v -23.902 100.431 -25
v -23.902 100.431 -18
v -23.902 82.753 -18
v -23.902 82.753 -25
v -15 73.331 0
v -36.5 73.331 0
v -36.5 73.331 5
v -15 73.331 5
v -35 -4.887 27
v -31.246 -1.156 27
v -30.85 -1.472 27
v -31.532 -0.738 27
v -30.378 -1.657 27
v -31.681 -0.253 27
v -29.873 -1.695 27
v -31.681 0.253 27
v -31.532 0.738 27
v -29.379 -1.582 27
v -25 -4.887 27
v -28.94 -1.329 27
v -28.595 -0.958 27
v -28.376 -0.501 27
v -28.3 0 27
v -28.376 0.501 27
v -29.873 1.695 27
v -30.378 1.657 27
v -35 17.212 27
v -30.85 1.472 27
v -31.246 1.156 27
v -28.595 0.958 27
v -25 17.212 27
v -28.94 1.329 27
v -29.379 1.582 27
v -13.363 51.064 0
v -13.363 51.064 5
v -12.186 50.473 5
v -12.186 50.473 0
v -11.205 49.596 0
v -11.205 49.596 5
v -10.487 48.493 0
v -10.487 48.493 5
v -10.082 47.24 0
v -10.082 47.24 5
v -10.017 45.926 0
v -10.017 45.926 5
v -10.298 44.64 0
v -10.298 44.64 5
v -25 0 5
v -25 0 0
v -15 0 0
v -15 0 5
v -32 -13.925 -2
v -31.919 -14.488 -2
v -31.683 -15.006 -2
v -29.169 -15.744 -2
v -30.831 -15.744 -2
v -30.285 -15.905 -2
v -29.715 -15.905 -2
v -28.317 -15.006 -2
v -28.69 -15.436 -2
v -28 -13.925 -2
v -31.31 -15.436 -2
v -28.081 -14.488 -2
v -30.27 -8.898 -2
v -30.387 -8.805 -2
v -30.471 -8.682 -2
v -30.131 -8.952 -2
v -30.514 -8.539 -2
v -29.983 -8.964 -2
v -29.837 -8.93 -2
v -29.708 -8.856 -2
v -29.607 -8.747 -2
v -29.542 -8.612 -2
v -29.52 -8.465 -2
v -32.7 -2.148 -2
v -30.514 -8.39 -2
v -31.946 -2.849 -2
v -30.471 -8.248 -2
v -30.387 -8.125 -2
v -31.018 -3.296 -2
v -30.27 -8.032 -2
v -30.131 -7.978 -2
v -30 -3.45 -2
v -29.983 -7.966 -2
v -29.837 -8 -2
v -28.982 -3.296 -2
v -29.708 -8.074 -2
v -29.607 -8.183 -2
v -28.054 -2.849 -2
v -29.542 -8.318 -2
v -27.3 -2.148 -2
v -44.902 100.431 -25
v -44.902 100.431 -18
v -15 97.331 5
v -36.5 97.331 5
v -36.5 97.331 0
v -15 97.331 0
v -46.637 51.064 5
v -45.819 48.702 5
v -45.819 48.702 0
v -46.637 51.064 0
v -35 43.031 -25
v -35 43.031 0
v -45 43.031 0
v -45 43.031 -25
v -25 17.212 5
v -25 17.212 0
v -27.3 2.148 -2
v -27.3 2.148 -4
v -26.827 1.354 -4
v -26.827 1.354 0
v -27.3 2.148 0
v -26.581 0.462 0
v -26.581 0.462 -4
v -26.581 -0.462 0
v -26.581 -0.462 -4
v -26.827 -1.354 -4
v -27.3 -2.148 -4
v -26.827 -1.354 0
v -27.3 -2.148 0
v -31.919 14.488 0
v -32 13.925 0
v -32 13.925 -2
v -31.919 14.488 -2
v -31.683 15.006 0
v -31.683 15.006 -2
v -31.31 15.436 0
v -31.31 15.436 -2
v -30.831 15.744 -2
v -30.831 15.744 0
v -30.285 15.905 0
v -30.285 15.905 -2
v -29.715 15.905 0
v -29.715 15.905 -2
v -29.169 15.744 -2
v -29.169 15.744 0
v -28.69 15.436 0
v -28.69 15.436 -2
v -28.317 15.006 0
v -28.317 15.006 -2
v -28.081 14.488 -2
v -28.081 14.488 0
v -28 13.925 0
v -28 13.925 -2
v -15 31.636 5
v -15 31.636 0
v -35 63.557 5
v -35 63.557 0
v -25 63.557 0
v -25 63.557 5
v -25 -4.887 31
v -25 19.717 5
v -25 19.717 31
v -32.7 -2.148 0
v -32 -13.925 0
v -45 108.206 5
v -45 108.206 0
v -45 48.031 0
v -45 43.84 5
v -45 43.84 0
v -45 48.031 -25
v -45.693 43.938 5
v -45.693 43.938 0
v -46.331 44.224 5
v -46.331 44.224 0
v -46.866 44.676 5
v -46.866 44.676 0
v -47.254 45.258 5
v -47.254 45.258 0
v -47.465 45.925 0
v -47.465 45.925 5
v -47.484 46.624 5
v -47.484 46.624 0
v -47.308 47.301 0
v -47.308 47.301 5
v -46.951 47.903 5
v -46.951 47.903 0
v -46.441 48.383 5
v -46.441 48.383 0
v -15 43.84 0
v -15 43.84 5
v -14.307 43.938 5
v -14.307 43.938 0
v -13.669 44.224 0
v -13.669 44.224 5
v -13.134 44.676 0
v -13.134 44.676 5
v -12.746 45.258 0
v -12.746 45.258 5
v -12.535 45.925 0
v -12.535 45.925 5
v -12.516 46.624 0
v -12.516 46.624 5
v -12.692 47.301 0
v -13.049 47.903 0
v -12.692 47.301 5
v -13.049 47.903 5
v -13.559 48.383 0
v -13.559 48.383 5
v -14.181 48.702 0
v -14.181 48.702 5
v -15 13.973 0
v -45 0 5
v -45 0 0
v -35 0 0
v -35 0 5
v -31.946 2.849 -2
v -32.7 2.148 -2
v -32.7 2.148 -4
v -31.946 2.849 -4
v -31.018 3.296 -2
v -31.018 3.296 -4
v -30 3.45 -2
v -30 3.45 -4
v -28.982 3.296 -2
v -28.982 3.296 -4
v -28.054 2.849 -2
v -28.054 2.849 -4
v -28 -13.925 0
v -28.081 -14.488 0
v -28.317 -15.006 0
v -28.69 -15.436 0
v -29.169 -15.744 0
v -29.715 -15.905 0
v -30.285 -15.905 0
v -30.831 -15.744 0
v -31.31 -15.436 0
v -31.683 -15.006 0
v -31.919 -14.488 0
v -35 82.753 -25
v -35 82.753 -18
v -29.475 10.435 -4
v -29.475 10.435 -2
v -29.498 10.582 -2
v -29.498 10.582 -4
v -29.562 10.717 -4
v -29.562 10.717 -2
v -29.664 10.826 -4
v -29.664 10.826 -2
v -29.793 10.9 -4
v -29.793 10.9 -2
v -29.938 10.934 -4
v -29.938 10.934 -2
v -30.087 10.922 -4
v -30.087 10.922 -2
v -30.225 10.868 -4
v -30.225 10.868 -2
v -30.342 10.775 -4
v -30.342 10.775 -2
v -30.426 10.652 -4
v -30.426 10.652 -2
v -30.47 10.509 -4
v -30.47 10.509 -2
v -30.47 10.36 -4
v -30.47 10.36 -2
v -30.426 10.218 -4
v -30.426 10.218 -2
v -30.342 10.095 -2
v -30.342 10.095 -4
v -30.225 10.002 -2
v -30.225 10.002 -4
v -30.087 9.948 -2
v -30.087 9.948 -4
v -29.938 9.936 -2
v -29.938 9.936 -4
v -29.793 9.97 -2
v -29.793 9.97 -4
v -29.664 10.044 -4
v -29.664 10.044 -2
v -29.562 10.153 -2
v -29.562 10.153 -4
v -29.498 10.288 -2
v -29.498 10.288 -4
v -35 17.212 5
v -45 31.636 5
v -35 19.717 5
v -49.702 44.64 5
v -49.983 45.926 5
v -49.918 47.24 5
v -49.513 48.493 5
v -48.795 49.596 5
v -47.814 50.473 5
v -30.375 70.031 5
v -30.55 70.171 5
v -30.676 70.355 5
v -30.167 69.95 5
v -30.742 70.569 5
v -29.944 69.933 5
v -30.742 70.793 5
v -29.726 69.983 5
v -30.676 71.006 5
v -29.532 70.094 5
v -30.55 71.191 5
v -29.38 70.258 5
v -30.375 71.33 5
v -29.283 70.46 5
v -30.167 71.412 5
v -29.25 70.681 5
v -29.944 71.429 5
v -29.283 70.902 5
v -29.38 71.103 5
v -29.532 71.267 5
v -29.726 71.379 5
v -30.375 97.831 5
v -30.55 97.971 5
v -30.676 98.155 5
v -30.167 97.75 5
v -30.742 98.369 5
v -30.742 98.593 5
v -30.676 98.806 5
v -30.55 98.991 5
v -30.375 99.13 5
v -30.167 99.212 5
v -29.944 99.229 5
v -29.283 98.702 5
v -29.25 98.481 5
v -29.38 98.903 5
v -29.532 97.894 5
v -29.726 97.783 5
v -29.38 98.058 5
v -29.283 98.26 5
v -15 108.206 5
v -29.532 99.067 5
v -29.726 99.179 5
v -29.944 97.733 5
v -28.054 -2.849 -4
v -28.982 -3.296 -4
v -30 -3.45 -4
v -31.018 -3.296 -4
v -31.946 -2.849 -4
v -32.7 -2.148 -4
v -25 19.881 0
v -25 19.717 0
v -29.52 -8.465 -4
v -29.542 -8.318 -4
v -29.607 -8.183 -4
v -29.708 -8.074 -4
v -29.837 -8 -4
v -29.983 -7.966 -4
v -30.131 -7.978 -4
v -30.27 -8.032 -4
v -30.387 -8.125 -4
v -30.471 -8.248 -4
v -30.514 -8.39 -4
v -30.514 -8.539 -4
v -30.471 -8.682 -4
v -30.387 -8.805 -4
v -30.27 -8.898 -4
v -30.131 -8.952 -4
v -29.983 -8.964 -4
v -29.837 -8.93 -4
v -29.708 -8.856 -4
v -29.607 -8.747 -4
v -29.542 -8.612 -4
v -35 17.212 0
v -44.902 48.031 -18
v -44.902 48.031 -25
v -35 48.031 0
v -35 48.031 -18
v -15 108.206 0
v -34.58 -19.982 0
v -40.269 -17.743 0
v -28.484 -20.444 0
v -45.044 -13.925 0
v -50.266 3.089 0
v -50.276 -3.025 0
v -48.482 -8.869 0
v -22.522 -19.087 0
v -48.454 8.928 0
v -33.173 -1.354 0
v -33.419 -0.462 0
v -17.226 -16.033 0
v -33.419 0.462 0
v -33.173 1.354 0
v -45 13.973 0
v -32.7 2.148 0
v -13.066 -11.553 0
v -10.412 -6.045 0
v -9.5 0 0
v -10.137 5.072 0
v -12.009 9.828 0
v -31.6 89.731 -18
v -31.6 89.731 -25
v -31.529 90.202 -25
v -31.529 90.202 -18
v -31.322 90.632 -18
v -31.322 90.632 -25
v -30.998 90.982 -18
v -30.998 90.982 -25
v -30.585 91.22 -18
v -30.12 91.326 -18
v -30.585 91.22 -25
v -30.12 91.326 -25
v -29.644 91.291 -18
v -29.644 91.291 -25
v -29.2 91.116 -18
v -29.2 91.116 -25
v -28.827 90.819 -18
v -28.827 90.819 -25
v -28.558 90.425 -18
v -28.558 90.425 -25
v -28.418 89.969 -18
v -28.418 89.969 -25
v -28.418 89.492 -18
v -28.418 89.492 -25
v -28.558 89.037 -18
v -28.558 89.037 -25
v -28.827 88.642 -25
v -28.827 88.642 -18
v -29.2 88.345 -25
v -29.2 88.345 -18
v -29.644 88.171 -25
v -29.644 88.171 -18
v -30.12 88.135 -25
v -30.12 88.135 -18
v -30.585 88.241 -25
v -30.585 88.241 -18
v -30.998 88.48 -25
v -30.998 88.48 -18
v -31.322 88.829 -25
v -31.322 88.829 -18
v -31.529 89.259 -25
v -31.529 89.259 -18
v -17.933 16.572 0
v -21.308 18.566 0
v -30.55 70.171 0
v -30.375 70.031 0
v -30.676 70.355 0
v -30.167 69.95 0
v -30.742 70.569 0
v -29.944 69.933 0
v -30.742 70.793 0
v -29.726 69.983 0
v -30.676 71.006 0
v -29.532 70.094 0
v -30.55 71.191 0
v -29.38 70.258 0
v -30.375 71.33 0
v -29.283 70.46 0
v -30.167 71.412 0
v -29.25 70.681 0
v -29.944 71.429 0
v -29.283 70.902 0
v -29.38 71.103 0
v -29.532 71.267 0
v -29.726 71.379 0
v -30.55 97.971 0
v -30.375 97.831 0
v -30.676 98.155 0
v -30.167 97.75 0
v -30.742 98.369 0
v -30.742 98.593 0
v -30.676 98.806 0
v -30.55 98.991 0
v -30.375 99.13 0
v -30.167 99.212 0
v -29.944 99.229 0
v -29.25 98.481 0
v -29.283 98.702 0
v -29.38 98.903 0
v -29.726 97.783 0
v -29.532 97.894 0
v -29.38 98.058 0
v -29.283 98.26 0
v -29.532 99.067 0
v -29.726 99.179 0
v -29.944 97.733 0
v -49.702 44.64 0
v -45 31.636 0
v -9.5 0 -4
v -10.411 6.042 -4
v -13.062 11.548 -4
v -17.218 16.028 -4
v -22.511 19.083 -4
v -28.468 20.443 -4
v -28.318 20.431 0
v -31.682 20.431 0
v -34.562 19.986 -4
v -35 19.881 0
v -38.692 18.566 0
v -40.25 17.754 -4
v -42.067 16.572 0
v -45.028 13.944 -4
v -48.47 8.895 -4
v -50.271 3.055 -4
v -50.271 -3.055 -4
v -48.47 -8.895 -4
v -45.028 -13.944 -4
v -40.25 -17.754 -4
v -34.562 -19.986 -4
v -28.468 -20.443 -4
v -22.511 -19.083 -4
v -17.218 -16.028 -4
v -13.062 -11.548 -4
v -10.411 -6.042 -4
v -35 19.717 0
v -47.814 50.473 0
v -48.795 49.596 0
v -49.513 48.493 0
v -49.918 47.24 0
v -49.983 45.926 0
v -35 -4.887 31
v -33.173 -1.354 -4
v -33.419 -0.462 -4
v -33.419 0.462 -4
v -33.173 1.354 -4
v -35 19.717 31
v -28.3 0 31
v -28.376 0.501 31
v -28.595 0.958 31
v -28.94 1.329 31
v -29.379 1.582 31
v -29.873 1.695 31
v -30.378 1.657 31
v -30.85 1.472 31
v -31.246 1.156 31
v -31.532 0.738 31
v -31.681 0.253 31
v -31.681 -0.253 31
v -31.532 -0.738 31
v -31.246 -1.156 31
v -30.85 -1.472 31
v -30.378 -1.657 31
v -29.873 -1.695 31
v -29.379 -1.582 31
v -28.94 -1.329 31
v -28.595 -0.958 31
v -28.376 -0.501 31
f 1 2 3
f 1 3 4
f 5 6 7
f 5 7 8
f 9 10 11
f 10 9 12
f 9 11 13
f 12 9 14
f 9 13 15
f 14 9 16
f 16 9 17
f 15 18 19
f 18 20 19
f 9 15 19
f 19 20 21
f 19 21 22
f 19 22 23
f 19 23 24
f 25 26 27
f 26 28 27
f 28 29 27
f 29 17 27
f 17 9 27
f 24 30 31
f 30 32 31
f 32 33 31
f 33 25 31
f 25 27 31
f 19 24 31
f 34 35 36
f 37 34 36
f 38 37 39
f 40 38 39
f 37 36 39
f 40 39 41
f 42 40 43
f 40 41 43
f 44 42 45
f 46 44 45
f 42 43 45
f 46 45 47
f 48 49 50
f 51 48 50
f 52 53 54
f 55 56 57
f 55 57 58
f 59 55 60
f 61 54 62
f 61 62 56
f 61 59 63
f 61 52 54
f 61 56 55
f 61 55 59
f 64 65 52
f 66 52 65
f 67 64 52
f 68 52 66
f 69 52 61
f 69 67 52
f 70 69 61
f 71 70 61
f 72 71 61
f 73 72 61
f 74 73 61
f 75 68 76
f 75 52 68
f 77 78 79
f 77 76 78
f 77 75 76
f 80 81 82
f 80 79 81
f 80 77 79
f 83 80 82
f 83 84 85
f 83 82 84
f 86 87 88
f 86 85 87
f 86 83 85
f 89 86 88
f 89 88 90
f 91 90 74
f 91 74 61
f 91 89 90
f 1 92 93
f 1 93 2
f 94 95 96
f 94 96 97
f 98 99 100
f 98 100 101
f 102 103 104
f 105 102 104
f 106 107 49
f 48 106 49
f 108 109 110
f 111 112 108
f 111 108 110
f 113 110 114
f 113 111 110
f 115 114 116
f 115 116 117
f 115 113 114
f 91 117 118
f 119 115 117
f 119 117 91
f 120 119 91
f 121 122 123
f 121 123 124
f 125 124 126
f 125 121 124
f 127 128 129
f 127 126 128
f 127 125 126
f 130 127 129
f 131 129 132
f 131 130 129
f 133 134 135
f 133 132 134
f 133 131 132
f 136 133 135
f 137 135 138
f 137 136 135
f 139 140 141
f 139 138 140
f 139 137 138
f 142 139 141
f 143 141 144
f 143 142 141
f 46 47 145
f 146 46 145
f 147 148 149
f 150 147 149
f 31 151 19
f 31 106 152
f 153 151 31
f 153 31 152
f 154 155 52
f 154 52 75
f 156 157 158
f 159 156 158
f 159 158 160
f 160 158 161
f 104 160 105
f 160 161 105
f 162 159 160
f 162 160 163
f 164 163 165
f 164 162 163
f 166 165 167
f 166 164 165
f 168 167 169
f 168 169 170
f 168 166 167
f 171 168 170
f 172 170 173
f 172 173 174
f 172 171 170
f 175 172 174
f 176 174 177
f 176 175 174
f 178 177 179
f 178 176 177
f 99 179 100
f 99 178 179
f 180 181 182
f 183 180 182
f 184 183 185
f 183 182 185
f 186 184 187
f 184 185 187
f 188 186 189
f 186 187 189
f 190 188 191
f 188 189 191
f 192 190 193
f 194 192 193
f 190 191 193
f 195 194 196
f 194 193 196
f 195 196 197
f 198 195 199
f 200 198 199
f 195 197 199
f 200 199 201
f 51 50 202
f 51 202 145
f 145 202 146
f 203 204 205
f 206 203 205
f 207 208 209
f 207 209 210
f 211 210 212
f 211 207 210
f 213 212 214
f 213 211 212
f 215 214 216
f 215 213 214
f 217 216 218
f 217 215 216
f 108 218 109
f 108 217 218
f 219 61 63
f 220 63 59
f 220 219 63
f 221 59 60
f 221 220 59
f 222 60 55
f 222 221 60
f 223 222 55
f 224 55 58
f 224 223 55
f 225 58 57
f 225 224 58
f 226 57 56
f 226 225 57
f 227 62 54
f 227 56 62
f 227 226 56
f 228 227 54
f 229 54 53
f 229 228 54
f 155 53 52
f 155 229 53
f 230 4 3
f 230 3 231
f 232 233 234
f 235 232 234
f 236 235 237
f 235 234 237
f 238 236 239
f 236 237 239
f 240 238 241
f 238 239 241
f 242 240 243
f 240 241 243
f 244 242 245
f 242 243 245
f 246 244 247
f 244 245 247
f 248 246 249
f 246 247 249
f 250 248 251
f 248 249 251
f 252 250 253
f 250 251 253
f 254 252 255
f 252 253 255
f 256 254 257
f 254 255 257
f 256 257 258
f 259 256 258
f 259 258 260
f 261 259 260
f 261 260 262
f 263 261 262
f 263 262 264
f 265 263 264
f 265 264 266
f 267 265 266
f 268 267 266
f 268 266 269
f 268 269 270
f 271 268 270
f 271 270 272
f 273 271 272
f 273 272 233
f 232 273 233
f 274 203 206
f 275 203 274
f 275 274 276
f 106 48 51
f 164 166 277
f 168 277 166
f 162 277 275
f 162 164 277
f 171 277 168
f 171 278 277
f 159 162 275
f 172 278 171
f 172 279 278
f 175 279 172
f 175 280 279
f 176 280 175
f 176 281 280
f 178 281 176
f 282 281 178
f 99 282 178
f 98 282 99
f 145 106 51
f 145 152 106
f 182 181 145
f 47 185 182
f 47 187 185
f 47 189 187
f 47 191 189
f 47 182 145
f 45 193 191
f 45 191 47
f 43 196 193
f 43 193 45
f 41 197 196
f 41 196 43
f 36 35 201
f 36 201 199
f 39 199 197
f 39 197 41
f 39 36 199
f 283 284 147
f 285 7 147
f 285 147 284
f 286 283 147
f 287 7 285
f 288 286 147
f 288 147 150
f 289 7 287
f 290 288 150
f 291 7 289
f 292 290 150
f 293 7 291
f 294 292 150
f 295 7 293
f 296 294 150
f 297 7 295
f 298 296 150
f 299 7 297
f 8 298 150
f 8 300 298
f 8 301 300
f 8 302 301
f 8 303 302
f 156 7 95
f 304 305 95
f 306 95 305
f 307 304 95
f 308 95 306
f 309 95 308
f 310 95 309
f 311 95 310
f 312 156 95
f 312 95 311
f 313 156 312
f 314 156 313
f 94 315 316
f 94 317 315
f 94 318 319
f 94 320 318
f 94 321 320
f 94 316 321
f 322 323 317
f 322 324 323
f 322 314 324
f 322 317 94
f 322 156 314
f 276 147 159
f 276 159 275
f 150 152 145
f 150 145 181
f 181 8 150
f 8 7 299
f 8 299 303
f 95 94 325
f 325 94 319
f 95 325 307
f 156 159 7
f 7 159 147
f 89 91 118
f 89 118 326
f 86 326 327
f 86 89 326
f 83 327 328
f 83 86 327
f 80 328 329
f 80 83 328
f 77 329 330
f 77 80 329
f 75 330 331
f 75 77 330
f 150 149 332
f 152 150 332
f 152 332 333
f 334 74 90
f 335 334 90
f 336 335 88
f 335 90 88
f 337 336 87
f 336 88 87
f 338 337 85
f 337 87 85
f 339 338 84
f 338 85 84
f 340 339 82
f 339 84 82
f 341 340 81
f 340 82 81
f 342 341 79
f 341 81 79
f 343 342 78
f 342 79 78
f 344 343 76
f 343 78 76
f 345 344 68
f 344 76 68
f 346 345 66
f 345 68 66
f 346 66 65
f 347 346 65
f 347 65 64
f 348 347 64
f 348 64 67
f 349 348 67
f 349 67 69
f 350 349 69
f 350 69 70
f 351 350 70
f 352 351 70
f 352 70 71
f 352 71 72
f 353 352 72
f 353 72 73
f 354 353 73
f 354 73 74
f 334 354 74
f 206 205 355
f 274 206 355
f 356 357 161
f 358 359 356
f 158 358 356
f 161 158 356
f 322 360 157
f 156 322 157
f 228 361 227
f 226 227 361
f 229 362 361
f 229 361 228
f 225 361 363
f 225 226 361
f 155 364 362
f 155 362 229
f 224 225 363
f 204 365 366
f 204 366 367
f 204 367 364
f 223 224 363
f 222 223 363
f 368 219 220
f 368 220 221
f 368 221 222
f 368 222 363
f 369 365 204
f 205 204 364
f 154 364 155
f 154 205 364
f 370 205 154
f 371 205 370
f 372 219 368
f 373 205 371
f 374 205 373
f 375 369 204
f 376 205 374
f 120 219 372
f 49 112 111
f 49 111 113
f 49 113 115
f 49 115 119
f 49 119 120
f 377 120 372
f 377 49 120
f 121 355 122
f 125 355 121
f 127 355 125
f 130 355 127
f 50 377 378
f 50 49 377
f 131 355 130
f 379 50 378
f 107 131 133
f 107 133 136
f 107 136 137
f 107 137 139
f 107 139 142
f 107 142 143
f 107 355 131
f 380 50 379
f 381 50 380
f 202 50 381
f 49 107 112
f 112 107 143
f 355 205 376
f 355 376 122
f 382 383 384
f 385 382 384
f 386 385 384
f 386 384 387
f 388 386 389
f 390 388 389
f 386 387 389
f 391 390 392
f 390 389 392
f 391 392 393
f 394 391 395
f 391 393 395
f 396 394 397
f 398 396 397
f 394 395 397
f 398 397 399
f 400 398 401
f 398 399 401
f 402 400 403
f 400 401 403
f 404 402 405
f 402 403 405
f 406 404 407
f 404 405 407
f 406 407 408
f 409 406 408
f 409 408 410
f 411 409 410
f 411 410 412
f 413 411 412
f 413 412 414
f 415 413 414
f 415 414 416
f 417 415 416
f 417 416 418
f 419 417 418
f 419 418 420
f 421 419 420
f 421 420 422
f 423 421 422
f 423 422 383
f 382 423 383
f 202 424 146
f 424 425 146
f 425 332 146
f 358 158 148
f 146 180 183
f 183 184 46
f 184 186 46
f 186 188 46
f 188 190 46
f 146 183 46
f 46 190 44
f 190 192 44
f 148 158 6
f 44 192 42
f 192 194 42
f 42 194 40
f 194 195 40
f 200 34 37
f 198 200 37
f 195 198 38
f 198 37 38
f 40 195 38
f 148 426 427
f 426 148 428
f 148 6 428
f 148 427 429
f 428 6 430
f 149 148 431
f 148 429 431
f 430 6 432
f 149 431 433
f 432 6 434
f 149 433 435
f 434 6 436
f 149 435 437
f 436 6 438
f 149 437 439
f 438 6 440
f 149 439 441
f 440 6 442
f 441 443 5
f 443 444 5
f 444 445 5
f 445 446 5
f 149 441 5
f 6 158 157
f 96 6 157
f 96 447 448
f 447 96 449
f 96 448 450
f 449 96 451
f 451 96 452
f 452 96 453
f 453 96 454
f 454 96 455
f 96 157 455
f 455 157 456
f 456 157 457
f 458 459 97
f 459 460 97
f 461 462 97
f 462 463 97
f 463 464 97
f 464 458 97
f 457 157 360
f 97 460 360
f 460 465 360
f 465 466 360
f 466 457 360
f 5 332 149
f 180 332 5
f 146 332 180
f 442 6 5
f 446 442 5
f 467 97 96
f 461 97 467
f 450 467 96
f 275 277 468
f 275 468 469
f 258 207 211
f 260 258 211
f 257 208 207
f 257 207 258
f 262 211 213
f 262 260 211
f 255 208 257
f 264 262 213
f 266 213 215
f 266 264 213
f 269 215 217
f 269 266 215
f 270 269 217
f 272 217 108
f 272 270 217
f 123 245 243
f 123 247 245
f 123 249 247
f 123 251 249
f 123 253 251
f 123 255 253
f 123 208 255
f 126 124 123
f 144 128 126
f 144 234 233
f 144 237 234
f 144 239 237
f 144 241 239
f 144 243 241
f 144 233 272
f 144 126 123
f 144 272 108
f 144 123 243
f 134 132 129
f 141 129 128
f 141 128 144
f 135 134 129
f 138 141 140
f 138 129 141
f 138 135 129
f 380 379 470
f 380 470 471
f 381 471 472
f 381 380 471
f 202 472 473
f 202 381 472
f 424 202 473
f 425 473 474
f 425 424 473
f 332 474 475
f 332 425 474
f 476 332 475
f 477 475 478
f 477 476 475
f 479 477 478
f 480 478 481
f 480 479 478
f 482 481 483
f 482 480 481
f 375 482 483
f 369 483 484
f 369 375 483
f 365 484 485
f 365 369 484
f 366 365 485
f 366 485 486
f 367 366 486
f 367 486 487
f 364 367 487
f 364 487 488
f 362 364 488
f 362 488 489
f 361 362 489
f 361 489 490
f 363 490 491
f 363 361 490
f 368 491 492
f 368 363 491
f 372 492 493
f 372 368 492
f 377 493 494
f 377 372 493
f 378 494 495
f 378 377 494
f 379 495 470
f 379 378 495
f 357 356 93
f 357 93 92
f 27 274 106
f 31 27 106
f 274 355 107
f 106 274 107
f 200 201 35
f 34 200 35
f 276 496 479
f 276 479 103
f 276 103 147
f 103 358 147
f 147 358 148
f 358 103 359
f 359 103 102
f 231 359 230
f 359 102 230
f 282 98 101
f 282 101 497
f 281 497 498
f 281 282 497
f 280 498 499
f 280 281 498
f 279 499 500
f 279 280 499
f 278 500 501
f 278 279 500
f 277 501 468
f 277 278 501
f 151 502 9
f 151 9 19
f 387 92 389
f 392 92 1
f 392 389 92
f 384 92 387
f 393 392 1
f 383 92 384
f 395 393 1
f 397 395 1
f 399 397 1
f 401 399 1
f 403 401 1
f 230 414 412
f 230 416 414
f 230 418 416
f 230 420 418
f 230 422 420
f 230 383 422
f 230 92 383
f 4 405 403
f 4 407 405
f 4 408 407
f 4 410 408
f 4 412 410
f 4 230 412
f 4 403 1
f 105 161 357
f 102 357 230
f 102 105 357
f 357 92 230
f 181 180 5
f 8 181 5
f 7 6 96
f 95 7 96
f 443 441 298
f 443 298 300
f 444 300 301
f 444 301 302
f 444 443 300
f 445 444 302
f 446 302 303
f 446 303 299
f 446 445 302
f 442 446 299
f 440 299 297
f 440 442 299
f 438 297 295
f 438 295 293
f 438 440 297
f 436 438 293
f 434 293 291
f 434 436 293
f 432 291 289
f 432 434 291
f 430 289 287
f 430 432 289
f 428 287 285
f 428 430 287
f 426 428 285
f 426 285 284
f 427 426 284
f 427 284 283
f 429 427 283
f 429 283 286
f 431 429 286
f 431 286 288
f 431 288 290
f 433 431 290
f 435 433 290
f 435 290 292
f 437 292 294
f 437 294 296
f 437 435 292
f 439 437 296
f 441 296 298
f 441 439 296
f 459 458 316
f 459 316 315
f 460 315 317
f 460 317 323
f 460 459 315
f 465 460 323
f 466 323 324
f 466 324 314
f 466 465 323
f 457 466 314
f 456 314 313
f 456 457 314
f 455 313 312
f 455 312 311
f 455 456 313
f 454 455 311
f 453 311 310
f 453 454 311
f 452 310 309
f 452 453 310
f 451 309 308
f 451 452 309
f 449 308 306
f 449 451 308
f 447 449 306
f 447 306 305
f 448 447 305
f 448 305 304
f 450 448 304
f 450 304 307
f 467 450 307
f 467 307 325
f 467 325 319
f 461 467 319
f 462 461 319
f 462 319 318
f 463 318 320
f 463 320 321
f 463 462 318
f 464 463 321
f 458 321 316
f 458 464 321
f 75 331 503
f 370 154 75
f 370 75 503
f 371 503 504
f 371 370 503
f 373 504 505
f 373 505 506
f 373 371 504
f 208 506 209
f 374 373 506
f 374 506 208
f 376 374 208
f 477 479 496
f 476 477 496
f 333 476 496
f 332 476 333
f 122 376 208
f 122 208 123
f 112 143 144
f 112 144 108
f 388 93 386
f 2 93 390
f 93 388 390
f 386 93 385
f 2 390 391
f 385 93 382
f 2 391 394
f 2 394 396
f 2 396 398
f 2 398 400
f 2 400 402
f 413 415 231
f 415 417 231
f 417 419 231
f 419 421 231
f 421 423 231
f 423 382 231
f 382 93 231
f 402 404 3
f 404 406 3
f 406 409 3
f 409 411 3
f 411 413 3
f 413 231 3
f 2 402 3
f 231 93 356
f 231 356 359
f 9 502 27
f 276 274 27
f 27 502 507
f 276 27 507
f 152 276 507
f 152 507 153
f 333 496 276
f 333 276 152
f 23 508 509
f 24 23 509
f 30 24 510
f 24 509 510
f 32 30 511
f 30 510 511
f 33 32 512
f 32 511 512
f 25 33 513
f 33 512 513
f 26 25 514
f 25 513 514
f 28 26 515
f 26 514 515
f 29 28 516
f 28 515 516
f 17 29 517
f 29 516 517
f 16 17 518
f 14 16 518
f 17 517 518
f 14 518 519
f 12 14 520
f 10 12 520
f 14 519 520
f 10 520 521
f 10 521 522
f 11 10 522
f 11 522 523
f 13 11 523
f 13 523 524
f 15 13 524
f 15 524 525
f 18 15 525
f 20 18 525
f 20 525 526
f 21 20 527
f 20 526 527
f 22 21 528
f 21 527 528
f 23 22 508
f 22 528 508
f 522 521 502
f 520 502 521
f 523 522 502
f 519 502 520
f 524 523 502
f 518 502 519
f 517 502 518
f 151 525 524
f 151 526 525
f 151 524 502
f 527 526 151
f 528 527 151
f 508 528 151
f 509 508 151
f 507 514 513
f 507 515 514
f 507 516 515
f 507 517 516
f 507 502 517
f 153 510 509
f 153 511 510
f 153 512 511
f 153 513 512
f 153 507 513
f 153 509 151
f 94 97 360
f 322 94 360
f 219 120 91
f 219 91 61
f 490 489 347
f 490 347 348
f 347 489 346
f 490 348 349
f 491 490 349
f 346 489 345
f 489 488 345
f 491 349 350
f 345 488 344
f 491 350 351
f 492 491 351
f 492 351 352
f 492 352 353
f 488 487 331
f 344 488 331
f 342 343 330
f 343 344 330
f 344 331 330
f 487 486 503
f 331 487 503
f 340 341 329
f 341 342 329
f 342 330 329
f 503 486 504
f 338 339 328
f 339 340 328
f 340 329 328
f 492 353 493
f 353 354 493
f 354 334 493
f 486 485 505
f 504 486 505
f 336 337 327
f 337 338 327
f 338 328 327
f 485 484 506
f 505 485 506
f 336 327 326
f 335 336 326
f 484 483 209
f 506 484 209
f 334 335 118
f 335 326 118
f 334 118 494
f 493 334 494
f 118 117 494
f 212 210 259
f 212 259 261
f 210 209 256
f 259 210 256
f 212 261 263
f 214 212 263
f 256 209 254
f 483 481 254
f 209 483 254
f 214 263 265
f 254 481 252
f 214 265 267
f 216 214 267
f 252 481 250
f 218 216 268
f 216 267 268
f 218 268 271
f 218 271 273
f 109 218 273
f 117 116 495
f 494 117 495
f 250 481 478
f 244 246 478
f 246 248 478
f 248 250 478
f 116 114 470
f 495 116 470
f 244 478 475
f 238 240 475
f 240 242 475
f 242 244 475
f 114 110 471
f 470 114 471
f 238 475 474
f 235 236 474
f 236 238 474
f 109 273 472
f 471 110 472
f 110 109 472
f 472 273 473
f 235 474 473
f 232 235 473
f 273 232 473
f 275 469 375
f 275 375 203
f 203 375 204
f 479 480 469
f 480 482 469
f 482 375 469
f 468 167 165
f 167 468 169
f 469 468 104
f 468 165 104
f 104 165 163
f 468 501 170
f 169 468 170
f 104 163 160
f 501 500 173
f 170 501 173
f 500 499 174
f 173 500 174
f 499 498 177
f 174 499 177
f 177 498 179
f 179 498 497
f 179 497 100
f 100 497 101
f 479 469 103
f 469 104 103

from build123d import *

# Parameters (mm, degrees)
SKETCH2_R           = 20.5
BOSS_EXTRUDE1_DEPTH = 4
BOSS_EXTRUDE2_START = -2
BOSS_EXTRUDE2_DEPTH = 2
SKETCH4_R           = 0.75
SKETCH4_W           = 13
SKETCH4_H           = 24
BOSS_EXTRUDE3_DEPTH = 5
SKETCH5_W           = 10
SKETCH5_H           = 5
BOSS_EXTRUDE4_DEPTH = 25
SKETCH6_W           = 21
SKETCH6_H           = 7
BOSS_EXTRUDE5_DEPTH = 52.4
SKETCH7_R           = 1.6
CUT_EXTRUDE1_DEPTH  = 52.4
SKETCH8_R           = 0.500000007
CUT_EXTRUDE2_DEPTH  = 10
SKETCH9_W           = 8.5
SKETCH9_H           = 24
CUT_EXTRUDE3_DEPTH  = 10
SKETCH10_W          = 10
SKETCH10_H          = 2.505647768
BOSS_EXTRUDE6_DEPTH = 31
SKETCH11_W          = 10
SKETCH11_H          = 24.604481137
SKETCH11_R          = 1.7
BOSS_EXTRUDE7_DEPTH = 4
BOSS_EXTRUDE8_DEPTH = 5
SKETCH13_W          = 11.098107646
SKETCH13_H          = 34.722384721
CUT_EXTRUDE4_DEPTH  = 10


with BuildPart() as part:
    # Sketch2 → Boss-Extrude1 (new body)
    with BuildSketch(Plane.XY):
        with Locations((-30.000000447, 0)):
            Circle(SKETCH2_R)
        with BuildLine():
            Line((-32.000000447, -13.925), (-32.700000447, -2.147673159))
            ThreePointArc((-32.700000447, -2.147673159), (-33.450000447, 0), (-32.700000447, 2.147673159))
            Line((-32.700000447, 2.147673159), (-32.000000447, 13.925))
            ThreePointArc((-32.000000447, 13.925), (-30.000000447, 15.925), (-28.000000447, 13.925))
            Line((-28.000000447, 13.925), (-27.300000447, 2.147673159))
            ThreePointArc((-27.300000447, 2.147673159), (-26.550000447, 0), (-27.300000447, -2.147673159))
            Line((-27.300000447, -2.147673159), (-28.000000447, -13.925))
            ThreePointArc((-28.000000447, -13.925), (-30.000000447, -15.925), (-32.000000447, -13.925))
        make_face(mode=Mode.SUBTRACT)
    extrude(amount=-BOSS_EXTRUDE1_DEPTH)

    # Sketch3 → Boss-Extrude2 (add)
    with BuildSketch(Plane(origin=(0, 0, -4), x_dir=(-1, 0, 0), z_dir=(0, 0, -1)).offset(BOSS_EXTRUDE2_START)):
        with BuildLine():
            Line((32.000000447, 13.925), (32.700000447, 2.147673159))
            ThreePointArc((32.700000447, 2.147673159), (30.000000278, 3.45000035), (27.300000447, 2.147673159))
            Line((27.300000447, 2.147673159), (28.000000447, 13.925))
            ThreePointArc((28.000000447, 13.925), (30.000000447, 15.925), (32.000000447, 13.925))
        make_face()
        with BuildLine():
            Line((32.700000447, -2.147673159), (32.000000447, -13.925))
            ThreePointArc((32.000000447, -13.925), (30.000000447, -15.925), (28.000000447, -13.925))
            Line((28.000000447, -13.925), (27.300000447, -2.147673159))
            ThreePointArc((27.300000447, -2.147673159), (30.000000278, -3.44999965), (32.700000447, -2.147673159))
        make_face()
    extrude(amount=BOSS_EXTRUDE2_DEPTH)

    # Sketch4 → Boss-Extrude3 (add)
    with BuildSketch(Plane.XY):
        Polygon((-45.000000447, 0), (-35.000000447, 0), (-35.000000447, 63.556554203), (-25.000000447, 63.556554203), (-25.000000447, 0), (-15.000000447, 0), (-15.000000447, 66.480727098), (-15.000000447, 108.20577925), (-45.000000447, 108.20577925), (-45.000000447, 66.480727098), align=None)
        with Locations((-30.000000447, 70.680727098)):
            Circle(SKETCH4_R, mode=Mode.SUBTRACT)
        with Locations((-30.000000447, 98.480727098)):
            Circle(SKETCH4_R, mode=Mode.SUBTRACT)
        with Locations((-30.000000447, 85.330727098)):
            Rectangle(SKETCH4_W, SKETCH4_H, mode=Mode.SUBTRACT)
    extrude(amount=BOSS_EXTRUDE3_DEPTH)

    # Sketch5 → Boss-Extrude4 (add)
    with BuildSketch(Plane(origin=(0, 0, 0), x_dir=(-1, 0, 0), z_dir=(0, 0, -1))):
        with Locations((40.000000447, 45.531062225)):
            Rectangle(SKETCH5_W, SKETCH5_H)
    extrude(amount=BOSS_EXTRUDE4_DEPTH)

    # Sketch6 → Boss-Extrude5 (add)
    with BuildSketch(Plane(origin=(0, 48.031062225, 0), x_dir=(1, 0, 0), z_dir=(0, 1, 0))):
        with Locations((-34.401892801, 21.5)):
            Rectangle(SKETCH6_W, SKETCH6_H)
    extrude(amount=BOSS_EXTRUDE5_DEPTH)

    # Sketch7 → Cut-Extrude1 (cut)
    with BuildSketch(Plane(origin=(0, 0, -25), x_dir=(-1, 0, 0), z_dir=(0, 0, -1))):
        with Locations((30.000000447, 89.730727098)):
            Circle(SKETCH7_R)
    extrude(amount=-CUT_EXTRUDE1_DEPTH, mode=Mode.SUBTRACT)

    # Sketch8 → Cut-Extrude2 (cut)
    with BuildSketch(Plane.XY):
        with Locations((-29.975317233, 10.434970799)):
            Circle(SKETCH8_R)
        with Locations((-30.020023773, -8.464976311)):
            Circle(SKETCH8_R)
    extrude(amount=-CUT_EXTRUDE2_DEPTH, mode=Mode.SUBTRACT)

    # Sketch9 → Cut-Extrude3 (cut)
    with BuildSketch(Plane.XY.offset(5)):
        with Locations((-19.250000447, 85.330727098)):
            Rectangle(SKETCH9_W, SKETCH9_H)
    extrude(amount=-CUT_EXTRUDE3_DEPTH, mode=Mode.SUBTRACT)

    # Sketch10 → Boss-Extrude6 (add)
    with BuildSketch(Plane.XY):
        with Locations((-30.000000447, 18.464419485)):
            Rectangle(SKETCH10_W, SKETCH10_H)
    extrude(amount=BOSS_EXTRUDE6_DEPTH)

    # Sketch11 → Boss-Extrude7 (add)
    with BuildSketch(Plane.XY.offset(31)):
        with Locations((-30.000000447, 7.415002801)):
            Rectangle(SKETCH11_W, SKETCH11_H)
        with Locations((-30.000000447, 0)):
            Circle(SKETCH11_R, mode=Mode.SUBTRACT)
    extrude(amount=-BOSS_EXTRUDE7_DEPTH)

    # Sketch12 → Boss-Extrude8 (add)
    with BuildSketch(Plane.XY.offset(5)):
        with BuildLine():
            Line((-14.181307682, 48.701973767), (-13.362614918, 51.064121552))
            ThreePointArc((-13.362614918, 51.064121552), (-10.487154092, 48.492549322), (-10.297966628, 44.639567777))
            Line((-10.297966628, 44.639567777), (-15.000000447, 31.636176901))
            Line((-15.000000447, 31.636176901), (-15.000000447, 43.839825982))
            ThreePointArc((-15.000000447, 43.839825982), (-12.534704373, 45.924717238), (-14.181307682, 48.701973767))
        make_face()
        with BuildLine():
            Line((-49.702034266, 44.639567777), (-45.000000447, 31.636176901))
            Line((-45.000000447, 31.636176901), (-45.000000447, 43.839825982))
            ThreePointArc((-45.000000447, 43.839825982), (-47.465296521, 45.924717238), (-45.818693212, 48.701973767))
            Line((-45.818693212, 48.701973767), (-46.637385976, 51.064121552))
            ThreePointArc((-46.637385976, 51.064121552), (-49.512846802, 48.492549322), (-49.702034266, 44.639567777))
        make_face()
    extrude(amount=-BOSS_EXTRUDE8_DEPTH)

    # Sketch13 → Cut-Extrude4 (cut)
    with BuildSketch(Plane(origin=(0, 0, -25), x_dir=(-1, 0, 0), z_dir=(0, 0, -1))):
        with Locations((29.450946624, 65.392254586)):
            Rectangle(SKETCH13_W, SKETCH13_H)
    extrude(amount=-CUT_EXTRUDE4_DEPTH, mode=Mode.SUBTRACT)


solid = part.part
